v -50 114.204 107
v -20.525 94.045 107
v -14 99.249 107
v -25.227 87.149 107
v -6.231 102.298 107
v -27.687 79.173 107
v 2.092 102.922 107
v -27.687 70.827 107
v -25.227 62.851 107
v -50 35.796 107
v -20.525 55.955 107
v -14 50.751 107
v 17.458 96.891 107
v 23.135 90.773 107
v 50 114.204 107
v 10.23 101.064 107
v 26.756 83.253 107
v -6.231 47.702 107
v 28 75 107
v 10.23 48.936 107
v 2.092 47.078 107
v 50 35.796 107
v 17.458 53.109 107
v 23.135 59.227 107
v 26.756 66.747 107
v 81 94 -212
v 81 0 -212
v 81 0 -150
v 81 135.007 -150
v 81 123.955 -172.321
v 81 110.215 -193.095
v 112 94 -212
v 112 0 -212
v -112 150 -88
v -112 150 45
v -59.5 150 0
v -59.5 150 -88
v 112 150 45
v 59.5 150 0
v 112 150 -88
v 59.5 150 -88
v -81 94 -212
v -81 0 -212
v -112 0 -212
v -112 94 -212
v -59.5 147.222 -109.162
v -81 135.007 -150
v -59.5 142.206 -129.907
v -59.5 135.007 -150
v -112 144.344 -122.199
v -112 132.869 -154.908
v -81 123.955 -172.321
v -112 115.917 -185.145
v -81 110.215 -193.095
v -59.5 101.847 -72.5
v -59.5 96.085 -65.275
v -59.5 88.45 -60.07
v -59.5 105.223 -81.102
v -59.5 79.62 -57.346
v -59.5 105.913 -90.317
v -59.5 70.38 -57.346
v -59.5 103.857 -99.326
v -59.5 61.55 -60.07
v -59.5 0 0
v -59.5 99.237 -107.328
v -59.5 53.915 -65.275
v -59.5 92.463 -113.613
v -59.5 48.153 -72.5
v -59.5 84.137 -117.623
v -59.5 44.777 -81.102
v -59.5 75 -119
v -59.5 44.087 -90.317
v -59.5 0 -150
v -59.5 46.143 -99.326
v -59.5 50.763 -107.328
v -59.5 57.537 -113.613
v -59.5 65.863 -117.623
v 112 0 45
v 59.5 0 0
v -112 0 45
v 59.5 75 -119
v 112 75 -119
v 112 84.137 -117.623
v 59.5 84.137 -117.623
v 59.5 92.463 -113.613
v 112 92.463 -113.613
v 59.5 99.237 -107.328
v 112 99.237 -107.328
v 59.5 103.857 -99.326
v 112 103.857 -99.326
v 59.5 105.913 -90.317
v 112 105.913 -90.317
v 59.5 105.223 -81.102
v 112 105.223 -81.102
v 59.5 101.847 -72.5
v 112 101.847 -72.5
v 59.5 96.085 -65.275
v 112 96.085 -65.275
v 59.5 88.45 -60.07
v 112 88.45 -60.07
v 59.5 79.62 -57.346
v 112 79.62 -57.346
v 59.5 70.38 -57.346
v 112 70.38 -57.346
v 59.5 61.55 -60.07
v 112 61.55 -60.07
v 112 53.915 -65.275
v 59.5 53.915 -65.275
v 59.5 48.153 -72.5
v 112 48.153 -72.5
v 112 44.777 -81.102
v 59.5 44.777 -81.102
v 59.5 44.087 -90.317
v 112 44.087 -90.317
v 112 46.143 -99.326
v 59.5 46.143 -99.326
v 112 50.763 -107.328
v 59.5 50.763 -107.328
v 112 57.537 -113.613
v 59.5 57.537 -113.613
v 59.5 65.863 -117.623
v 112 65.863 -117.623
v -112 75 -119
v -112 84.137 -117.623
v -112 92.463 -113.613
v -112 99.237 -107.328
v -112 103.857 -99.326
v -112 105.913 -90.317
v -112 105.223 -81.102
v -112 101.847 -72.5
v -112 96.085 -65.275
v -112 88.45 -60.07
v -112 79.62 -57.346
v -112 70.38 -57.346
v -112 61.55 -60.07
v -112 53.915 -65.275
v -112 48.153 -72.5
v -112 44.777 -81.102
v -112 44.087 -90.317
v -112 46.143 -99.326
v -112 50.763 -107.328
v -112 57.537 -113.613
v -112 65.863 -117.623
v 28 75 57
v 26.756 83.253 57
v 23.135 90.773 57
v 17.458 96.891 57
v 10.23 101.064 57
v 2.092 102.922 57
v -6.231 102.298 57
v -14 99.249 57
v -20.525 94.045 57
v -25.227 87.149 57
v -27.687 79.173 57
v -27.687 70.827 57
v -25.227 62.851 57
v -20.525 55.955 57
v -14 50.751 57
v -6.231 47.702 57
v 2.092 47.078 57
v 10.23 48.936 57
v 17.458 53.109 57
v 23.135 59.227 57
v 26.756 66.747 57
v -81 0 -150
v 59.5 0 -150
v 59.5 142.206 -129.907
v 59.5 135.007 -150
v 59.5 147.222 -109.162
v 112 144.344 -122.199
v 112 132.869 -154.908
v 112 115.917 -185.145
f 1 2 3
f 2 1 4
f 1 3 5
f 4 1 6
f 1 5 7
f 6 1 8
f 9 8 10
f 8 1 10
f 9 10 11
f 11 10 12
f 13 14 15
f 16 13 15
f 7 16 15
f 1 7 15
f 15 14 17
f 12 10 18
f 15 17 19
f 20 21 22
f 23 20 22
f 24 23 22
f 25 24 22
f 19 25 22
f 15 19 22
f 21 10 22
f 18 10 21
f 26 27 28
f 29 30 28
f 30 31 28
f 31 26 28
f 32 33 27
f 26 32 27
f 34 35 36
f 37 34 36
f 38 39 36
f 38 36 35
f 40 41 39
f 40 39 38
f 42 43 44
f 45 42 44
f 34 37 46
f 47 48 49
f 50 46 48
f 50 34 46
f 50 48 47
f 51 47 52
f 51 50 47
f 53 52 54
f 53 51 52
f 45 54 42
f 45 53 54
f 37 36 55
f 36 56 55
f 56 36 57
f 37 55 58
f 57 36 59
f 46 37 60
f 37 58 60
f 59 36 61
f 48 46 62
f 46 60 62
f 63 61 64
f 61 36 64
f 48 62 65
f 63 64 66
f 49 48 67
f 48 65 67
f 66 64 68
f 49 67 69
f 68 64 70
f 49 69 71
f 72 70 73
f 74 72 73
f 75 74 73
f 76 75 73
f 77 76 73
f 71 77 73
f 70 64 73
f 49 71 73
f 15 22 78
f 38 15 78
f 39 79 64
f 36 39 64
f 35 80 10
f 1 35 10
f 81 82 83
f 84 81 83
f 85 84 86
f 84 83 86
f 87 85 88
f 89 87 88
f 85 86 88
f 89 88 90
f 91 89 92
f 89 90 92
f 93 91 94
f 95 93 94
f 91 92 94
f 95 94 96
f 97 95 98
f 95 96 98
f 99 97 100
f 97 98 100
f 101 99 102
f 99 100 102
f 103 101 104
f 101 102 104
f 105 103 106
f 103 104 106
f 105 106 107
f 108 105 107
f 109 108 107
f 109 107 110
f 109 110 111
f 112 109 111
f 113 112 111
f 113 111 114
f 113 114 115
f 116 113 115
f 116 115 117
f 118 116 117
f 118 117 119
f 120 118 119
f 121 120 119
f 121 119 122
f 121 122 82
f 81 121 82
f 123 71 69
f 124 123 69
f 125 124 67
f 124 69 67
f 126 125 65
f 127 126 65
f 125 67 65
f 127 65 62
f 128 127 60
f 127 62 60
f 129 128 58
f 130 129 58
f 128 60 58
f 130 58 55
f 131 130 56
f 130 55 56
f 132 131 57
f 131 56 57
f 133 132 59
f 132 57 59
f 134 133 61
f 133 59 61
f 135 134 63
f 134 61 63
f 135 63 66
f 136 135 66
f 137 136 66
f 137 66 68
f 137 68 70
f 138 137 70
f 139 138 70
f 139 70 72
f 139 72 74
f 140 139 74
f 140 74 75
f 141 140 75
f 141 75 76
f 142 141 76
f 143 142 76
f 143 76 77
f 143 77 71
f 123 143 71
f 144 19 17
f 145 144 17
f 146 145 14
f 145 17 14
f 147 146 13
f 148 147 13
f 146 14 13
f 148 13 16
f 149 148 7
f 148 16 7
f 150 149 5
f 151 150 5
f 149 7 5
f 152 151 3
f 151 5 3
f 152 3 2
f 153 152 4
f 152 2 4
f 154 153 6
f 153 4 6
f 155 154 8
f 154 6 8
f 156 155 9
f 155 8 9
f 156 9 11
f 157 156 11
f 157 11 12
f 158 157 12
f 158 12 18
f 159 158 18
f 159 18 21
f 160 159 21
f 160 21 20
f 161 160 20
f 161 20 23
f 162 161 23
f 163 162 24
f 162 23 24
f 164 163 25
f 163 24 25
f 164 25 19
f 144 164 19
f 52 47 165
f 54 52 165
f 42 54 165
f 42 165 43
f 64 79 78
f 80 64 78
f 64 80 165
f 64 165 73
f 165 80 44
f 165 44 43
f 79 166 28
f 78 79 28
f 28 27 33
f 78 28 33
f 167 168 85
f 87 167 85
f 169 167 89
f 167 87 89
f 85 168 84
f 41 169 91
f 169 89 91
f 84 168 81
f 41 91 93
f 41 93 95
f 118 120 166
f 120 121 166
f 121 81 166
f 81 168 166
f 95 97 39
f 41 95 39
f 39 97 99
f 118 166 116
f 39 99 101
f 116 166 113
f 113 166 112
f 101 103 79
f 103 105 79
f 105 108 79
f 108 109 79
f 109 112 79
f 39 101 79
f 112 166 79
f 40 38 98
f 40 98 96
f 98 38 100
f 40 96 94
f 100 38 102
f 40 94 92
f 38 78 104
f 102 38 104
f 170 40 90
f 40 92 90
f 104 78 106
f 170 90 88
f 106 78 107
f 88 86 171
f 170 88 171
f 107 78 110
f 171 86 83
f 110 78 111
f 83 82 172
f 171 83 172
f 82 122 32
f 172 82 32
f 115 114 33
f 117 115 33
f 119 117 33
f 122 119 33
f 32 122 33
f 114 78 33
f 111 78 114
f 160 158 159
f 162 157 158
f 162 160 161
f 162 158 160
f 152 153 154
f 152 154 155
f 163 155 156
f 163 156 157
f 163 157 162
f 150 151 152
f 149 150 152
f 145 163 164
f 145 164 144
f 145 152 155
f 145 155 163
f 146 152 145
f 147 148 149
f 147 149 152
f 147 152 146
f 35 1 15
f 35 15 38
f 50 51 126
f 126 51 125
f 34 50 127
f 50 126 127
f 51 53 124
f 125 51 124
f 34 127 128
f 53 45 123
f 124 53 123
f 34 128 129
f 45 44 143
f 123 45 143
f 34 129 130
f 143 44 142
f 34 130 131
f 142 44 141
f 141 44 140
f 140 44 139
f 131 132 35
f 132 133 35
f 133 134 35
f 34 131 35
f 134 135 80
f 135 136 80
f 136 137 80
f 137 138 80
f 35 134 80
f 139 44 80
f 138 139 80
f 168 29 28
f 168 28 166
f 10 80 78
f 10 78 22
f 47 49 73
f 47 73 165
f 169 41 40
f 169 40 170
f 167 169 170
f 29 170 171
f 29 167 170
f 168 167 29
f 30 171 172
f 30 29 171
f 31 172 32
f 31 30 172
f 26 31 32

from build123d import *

# Parameters (mm, degrees)
BOSS_EXTRUDE1_DEPTH     = 150
CUT_EXTRUDE1_DEPTH      = 112
CUT_EXTRUDE1_DEPTH_BACK = 112
CUT_EXTRUDE2_DEPTH      = 112
CUT_EXTRUDE2_DEPTH_BACK = 112
SKETCH5_R               = 28
CUT_EXTRUDE3_DEPTH      = 50
SKETCH6_R               = 31
CUT_EXTRUDE4_DEPTH      = 224


with BuildPart() as part:
    # Sketch1 → Boss-Extrude1 (new body)
    with BuildSketch(Plane(origin=(0, 0, 0), x_dir=(1, 0, 0), z_dir=(0, 1, 0))):
        Polygon((59.5, 0), (-59.5, 0), (-59.5, 150), (-81, 150), (-81, 212), (-112, 212), (-112, -45), (-50, -107), (50, -107), (112, -45), (112, 212), (81, 212), (81, 150), (59.5, 150), align=None)
    extrude(amount=BOSS_EXTRUDE1_DEPTH)

    # Sketch3 → Cut-Extrude1 (cut, two sides: drawn at the far end of the back side and taken through both)
    with BuildSketch(Plane(origin=(0, 0, 0), x_dir=(0, 0, -1), z_dir=(1, 0, 0)).offset(-CUT_EXTRUDE1_DEPTH_BACK)):
        Polygon((-107, 150), (-107, 114.20428331), (-45, 150), align=None)
        Polygon((-107, 0), (-45, 0), (-107, 35.79571669), align=None)
    extrude(amount=CUT_EXTRUDE1_DEPTH + CUT_EXTRUDE1_DEPTH_BACK, mode=Mode.SUBTRACT)

    # Sketch4 → Cut-Extrude2 (cut, two sides: drawn at the far end of the back side and taken through both)
    with BuildSketch(Plane(origin=(0, 0, 0), x_dir=(0, 0, -1), z_dir=(1, 0, 0)).offset(-CUT_EXTRUDE2_DEPTH_BACK)):
        with BuildLine():
            Line((212, 150), (88, 150))
            ThreePointArc((88, 150), (154.908396662, 132.868592609), (212, 94))
            Line((212, 94), (212, 150))
        make_face()
    extrude(amount=CUT_EXTRUDE2_DEPTH + CUT_EXTRUDE2_DEPTH_BACK, mode=Mode.SUBTRACT)

    # Sketch5 → Cut-Extrude3 (cut)
    with BuildSketch(Plane.XY.offset(107)):
        with Locations((0, 75)):
            Circle(SKETCH5_R)
    extrude(amount=-CUT_EXTRUDE3_DEPTH, mode=Mode.SUBTRACT)

    # Sketch6 → Cut-Extrude4 (cut)
    with BuildSketch(Plane(origin=(112, 0, 0), x_dir=(0, 0, -1), z_dir=(1, 0, 0))):
        with Locations((88, 75)):
            Circle(SKETCH6_R)
    extrude(amount=-CUT_EXTRUDE4_DEPTH, mode=Mode.SUBTRACT)


solid = part.part
